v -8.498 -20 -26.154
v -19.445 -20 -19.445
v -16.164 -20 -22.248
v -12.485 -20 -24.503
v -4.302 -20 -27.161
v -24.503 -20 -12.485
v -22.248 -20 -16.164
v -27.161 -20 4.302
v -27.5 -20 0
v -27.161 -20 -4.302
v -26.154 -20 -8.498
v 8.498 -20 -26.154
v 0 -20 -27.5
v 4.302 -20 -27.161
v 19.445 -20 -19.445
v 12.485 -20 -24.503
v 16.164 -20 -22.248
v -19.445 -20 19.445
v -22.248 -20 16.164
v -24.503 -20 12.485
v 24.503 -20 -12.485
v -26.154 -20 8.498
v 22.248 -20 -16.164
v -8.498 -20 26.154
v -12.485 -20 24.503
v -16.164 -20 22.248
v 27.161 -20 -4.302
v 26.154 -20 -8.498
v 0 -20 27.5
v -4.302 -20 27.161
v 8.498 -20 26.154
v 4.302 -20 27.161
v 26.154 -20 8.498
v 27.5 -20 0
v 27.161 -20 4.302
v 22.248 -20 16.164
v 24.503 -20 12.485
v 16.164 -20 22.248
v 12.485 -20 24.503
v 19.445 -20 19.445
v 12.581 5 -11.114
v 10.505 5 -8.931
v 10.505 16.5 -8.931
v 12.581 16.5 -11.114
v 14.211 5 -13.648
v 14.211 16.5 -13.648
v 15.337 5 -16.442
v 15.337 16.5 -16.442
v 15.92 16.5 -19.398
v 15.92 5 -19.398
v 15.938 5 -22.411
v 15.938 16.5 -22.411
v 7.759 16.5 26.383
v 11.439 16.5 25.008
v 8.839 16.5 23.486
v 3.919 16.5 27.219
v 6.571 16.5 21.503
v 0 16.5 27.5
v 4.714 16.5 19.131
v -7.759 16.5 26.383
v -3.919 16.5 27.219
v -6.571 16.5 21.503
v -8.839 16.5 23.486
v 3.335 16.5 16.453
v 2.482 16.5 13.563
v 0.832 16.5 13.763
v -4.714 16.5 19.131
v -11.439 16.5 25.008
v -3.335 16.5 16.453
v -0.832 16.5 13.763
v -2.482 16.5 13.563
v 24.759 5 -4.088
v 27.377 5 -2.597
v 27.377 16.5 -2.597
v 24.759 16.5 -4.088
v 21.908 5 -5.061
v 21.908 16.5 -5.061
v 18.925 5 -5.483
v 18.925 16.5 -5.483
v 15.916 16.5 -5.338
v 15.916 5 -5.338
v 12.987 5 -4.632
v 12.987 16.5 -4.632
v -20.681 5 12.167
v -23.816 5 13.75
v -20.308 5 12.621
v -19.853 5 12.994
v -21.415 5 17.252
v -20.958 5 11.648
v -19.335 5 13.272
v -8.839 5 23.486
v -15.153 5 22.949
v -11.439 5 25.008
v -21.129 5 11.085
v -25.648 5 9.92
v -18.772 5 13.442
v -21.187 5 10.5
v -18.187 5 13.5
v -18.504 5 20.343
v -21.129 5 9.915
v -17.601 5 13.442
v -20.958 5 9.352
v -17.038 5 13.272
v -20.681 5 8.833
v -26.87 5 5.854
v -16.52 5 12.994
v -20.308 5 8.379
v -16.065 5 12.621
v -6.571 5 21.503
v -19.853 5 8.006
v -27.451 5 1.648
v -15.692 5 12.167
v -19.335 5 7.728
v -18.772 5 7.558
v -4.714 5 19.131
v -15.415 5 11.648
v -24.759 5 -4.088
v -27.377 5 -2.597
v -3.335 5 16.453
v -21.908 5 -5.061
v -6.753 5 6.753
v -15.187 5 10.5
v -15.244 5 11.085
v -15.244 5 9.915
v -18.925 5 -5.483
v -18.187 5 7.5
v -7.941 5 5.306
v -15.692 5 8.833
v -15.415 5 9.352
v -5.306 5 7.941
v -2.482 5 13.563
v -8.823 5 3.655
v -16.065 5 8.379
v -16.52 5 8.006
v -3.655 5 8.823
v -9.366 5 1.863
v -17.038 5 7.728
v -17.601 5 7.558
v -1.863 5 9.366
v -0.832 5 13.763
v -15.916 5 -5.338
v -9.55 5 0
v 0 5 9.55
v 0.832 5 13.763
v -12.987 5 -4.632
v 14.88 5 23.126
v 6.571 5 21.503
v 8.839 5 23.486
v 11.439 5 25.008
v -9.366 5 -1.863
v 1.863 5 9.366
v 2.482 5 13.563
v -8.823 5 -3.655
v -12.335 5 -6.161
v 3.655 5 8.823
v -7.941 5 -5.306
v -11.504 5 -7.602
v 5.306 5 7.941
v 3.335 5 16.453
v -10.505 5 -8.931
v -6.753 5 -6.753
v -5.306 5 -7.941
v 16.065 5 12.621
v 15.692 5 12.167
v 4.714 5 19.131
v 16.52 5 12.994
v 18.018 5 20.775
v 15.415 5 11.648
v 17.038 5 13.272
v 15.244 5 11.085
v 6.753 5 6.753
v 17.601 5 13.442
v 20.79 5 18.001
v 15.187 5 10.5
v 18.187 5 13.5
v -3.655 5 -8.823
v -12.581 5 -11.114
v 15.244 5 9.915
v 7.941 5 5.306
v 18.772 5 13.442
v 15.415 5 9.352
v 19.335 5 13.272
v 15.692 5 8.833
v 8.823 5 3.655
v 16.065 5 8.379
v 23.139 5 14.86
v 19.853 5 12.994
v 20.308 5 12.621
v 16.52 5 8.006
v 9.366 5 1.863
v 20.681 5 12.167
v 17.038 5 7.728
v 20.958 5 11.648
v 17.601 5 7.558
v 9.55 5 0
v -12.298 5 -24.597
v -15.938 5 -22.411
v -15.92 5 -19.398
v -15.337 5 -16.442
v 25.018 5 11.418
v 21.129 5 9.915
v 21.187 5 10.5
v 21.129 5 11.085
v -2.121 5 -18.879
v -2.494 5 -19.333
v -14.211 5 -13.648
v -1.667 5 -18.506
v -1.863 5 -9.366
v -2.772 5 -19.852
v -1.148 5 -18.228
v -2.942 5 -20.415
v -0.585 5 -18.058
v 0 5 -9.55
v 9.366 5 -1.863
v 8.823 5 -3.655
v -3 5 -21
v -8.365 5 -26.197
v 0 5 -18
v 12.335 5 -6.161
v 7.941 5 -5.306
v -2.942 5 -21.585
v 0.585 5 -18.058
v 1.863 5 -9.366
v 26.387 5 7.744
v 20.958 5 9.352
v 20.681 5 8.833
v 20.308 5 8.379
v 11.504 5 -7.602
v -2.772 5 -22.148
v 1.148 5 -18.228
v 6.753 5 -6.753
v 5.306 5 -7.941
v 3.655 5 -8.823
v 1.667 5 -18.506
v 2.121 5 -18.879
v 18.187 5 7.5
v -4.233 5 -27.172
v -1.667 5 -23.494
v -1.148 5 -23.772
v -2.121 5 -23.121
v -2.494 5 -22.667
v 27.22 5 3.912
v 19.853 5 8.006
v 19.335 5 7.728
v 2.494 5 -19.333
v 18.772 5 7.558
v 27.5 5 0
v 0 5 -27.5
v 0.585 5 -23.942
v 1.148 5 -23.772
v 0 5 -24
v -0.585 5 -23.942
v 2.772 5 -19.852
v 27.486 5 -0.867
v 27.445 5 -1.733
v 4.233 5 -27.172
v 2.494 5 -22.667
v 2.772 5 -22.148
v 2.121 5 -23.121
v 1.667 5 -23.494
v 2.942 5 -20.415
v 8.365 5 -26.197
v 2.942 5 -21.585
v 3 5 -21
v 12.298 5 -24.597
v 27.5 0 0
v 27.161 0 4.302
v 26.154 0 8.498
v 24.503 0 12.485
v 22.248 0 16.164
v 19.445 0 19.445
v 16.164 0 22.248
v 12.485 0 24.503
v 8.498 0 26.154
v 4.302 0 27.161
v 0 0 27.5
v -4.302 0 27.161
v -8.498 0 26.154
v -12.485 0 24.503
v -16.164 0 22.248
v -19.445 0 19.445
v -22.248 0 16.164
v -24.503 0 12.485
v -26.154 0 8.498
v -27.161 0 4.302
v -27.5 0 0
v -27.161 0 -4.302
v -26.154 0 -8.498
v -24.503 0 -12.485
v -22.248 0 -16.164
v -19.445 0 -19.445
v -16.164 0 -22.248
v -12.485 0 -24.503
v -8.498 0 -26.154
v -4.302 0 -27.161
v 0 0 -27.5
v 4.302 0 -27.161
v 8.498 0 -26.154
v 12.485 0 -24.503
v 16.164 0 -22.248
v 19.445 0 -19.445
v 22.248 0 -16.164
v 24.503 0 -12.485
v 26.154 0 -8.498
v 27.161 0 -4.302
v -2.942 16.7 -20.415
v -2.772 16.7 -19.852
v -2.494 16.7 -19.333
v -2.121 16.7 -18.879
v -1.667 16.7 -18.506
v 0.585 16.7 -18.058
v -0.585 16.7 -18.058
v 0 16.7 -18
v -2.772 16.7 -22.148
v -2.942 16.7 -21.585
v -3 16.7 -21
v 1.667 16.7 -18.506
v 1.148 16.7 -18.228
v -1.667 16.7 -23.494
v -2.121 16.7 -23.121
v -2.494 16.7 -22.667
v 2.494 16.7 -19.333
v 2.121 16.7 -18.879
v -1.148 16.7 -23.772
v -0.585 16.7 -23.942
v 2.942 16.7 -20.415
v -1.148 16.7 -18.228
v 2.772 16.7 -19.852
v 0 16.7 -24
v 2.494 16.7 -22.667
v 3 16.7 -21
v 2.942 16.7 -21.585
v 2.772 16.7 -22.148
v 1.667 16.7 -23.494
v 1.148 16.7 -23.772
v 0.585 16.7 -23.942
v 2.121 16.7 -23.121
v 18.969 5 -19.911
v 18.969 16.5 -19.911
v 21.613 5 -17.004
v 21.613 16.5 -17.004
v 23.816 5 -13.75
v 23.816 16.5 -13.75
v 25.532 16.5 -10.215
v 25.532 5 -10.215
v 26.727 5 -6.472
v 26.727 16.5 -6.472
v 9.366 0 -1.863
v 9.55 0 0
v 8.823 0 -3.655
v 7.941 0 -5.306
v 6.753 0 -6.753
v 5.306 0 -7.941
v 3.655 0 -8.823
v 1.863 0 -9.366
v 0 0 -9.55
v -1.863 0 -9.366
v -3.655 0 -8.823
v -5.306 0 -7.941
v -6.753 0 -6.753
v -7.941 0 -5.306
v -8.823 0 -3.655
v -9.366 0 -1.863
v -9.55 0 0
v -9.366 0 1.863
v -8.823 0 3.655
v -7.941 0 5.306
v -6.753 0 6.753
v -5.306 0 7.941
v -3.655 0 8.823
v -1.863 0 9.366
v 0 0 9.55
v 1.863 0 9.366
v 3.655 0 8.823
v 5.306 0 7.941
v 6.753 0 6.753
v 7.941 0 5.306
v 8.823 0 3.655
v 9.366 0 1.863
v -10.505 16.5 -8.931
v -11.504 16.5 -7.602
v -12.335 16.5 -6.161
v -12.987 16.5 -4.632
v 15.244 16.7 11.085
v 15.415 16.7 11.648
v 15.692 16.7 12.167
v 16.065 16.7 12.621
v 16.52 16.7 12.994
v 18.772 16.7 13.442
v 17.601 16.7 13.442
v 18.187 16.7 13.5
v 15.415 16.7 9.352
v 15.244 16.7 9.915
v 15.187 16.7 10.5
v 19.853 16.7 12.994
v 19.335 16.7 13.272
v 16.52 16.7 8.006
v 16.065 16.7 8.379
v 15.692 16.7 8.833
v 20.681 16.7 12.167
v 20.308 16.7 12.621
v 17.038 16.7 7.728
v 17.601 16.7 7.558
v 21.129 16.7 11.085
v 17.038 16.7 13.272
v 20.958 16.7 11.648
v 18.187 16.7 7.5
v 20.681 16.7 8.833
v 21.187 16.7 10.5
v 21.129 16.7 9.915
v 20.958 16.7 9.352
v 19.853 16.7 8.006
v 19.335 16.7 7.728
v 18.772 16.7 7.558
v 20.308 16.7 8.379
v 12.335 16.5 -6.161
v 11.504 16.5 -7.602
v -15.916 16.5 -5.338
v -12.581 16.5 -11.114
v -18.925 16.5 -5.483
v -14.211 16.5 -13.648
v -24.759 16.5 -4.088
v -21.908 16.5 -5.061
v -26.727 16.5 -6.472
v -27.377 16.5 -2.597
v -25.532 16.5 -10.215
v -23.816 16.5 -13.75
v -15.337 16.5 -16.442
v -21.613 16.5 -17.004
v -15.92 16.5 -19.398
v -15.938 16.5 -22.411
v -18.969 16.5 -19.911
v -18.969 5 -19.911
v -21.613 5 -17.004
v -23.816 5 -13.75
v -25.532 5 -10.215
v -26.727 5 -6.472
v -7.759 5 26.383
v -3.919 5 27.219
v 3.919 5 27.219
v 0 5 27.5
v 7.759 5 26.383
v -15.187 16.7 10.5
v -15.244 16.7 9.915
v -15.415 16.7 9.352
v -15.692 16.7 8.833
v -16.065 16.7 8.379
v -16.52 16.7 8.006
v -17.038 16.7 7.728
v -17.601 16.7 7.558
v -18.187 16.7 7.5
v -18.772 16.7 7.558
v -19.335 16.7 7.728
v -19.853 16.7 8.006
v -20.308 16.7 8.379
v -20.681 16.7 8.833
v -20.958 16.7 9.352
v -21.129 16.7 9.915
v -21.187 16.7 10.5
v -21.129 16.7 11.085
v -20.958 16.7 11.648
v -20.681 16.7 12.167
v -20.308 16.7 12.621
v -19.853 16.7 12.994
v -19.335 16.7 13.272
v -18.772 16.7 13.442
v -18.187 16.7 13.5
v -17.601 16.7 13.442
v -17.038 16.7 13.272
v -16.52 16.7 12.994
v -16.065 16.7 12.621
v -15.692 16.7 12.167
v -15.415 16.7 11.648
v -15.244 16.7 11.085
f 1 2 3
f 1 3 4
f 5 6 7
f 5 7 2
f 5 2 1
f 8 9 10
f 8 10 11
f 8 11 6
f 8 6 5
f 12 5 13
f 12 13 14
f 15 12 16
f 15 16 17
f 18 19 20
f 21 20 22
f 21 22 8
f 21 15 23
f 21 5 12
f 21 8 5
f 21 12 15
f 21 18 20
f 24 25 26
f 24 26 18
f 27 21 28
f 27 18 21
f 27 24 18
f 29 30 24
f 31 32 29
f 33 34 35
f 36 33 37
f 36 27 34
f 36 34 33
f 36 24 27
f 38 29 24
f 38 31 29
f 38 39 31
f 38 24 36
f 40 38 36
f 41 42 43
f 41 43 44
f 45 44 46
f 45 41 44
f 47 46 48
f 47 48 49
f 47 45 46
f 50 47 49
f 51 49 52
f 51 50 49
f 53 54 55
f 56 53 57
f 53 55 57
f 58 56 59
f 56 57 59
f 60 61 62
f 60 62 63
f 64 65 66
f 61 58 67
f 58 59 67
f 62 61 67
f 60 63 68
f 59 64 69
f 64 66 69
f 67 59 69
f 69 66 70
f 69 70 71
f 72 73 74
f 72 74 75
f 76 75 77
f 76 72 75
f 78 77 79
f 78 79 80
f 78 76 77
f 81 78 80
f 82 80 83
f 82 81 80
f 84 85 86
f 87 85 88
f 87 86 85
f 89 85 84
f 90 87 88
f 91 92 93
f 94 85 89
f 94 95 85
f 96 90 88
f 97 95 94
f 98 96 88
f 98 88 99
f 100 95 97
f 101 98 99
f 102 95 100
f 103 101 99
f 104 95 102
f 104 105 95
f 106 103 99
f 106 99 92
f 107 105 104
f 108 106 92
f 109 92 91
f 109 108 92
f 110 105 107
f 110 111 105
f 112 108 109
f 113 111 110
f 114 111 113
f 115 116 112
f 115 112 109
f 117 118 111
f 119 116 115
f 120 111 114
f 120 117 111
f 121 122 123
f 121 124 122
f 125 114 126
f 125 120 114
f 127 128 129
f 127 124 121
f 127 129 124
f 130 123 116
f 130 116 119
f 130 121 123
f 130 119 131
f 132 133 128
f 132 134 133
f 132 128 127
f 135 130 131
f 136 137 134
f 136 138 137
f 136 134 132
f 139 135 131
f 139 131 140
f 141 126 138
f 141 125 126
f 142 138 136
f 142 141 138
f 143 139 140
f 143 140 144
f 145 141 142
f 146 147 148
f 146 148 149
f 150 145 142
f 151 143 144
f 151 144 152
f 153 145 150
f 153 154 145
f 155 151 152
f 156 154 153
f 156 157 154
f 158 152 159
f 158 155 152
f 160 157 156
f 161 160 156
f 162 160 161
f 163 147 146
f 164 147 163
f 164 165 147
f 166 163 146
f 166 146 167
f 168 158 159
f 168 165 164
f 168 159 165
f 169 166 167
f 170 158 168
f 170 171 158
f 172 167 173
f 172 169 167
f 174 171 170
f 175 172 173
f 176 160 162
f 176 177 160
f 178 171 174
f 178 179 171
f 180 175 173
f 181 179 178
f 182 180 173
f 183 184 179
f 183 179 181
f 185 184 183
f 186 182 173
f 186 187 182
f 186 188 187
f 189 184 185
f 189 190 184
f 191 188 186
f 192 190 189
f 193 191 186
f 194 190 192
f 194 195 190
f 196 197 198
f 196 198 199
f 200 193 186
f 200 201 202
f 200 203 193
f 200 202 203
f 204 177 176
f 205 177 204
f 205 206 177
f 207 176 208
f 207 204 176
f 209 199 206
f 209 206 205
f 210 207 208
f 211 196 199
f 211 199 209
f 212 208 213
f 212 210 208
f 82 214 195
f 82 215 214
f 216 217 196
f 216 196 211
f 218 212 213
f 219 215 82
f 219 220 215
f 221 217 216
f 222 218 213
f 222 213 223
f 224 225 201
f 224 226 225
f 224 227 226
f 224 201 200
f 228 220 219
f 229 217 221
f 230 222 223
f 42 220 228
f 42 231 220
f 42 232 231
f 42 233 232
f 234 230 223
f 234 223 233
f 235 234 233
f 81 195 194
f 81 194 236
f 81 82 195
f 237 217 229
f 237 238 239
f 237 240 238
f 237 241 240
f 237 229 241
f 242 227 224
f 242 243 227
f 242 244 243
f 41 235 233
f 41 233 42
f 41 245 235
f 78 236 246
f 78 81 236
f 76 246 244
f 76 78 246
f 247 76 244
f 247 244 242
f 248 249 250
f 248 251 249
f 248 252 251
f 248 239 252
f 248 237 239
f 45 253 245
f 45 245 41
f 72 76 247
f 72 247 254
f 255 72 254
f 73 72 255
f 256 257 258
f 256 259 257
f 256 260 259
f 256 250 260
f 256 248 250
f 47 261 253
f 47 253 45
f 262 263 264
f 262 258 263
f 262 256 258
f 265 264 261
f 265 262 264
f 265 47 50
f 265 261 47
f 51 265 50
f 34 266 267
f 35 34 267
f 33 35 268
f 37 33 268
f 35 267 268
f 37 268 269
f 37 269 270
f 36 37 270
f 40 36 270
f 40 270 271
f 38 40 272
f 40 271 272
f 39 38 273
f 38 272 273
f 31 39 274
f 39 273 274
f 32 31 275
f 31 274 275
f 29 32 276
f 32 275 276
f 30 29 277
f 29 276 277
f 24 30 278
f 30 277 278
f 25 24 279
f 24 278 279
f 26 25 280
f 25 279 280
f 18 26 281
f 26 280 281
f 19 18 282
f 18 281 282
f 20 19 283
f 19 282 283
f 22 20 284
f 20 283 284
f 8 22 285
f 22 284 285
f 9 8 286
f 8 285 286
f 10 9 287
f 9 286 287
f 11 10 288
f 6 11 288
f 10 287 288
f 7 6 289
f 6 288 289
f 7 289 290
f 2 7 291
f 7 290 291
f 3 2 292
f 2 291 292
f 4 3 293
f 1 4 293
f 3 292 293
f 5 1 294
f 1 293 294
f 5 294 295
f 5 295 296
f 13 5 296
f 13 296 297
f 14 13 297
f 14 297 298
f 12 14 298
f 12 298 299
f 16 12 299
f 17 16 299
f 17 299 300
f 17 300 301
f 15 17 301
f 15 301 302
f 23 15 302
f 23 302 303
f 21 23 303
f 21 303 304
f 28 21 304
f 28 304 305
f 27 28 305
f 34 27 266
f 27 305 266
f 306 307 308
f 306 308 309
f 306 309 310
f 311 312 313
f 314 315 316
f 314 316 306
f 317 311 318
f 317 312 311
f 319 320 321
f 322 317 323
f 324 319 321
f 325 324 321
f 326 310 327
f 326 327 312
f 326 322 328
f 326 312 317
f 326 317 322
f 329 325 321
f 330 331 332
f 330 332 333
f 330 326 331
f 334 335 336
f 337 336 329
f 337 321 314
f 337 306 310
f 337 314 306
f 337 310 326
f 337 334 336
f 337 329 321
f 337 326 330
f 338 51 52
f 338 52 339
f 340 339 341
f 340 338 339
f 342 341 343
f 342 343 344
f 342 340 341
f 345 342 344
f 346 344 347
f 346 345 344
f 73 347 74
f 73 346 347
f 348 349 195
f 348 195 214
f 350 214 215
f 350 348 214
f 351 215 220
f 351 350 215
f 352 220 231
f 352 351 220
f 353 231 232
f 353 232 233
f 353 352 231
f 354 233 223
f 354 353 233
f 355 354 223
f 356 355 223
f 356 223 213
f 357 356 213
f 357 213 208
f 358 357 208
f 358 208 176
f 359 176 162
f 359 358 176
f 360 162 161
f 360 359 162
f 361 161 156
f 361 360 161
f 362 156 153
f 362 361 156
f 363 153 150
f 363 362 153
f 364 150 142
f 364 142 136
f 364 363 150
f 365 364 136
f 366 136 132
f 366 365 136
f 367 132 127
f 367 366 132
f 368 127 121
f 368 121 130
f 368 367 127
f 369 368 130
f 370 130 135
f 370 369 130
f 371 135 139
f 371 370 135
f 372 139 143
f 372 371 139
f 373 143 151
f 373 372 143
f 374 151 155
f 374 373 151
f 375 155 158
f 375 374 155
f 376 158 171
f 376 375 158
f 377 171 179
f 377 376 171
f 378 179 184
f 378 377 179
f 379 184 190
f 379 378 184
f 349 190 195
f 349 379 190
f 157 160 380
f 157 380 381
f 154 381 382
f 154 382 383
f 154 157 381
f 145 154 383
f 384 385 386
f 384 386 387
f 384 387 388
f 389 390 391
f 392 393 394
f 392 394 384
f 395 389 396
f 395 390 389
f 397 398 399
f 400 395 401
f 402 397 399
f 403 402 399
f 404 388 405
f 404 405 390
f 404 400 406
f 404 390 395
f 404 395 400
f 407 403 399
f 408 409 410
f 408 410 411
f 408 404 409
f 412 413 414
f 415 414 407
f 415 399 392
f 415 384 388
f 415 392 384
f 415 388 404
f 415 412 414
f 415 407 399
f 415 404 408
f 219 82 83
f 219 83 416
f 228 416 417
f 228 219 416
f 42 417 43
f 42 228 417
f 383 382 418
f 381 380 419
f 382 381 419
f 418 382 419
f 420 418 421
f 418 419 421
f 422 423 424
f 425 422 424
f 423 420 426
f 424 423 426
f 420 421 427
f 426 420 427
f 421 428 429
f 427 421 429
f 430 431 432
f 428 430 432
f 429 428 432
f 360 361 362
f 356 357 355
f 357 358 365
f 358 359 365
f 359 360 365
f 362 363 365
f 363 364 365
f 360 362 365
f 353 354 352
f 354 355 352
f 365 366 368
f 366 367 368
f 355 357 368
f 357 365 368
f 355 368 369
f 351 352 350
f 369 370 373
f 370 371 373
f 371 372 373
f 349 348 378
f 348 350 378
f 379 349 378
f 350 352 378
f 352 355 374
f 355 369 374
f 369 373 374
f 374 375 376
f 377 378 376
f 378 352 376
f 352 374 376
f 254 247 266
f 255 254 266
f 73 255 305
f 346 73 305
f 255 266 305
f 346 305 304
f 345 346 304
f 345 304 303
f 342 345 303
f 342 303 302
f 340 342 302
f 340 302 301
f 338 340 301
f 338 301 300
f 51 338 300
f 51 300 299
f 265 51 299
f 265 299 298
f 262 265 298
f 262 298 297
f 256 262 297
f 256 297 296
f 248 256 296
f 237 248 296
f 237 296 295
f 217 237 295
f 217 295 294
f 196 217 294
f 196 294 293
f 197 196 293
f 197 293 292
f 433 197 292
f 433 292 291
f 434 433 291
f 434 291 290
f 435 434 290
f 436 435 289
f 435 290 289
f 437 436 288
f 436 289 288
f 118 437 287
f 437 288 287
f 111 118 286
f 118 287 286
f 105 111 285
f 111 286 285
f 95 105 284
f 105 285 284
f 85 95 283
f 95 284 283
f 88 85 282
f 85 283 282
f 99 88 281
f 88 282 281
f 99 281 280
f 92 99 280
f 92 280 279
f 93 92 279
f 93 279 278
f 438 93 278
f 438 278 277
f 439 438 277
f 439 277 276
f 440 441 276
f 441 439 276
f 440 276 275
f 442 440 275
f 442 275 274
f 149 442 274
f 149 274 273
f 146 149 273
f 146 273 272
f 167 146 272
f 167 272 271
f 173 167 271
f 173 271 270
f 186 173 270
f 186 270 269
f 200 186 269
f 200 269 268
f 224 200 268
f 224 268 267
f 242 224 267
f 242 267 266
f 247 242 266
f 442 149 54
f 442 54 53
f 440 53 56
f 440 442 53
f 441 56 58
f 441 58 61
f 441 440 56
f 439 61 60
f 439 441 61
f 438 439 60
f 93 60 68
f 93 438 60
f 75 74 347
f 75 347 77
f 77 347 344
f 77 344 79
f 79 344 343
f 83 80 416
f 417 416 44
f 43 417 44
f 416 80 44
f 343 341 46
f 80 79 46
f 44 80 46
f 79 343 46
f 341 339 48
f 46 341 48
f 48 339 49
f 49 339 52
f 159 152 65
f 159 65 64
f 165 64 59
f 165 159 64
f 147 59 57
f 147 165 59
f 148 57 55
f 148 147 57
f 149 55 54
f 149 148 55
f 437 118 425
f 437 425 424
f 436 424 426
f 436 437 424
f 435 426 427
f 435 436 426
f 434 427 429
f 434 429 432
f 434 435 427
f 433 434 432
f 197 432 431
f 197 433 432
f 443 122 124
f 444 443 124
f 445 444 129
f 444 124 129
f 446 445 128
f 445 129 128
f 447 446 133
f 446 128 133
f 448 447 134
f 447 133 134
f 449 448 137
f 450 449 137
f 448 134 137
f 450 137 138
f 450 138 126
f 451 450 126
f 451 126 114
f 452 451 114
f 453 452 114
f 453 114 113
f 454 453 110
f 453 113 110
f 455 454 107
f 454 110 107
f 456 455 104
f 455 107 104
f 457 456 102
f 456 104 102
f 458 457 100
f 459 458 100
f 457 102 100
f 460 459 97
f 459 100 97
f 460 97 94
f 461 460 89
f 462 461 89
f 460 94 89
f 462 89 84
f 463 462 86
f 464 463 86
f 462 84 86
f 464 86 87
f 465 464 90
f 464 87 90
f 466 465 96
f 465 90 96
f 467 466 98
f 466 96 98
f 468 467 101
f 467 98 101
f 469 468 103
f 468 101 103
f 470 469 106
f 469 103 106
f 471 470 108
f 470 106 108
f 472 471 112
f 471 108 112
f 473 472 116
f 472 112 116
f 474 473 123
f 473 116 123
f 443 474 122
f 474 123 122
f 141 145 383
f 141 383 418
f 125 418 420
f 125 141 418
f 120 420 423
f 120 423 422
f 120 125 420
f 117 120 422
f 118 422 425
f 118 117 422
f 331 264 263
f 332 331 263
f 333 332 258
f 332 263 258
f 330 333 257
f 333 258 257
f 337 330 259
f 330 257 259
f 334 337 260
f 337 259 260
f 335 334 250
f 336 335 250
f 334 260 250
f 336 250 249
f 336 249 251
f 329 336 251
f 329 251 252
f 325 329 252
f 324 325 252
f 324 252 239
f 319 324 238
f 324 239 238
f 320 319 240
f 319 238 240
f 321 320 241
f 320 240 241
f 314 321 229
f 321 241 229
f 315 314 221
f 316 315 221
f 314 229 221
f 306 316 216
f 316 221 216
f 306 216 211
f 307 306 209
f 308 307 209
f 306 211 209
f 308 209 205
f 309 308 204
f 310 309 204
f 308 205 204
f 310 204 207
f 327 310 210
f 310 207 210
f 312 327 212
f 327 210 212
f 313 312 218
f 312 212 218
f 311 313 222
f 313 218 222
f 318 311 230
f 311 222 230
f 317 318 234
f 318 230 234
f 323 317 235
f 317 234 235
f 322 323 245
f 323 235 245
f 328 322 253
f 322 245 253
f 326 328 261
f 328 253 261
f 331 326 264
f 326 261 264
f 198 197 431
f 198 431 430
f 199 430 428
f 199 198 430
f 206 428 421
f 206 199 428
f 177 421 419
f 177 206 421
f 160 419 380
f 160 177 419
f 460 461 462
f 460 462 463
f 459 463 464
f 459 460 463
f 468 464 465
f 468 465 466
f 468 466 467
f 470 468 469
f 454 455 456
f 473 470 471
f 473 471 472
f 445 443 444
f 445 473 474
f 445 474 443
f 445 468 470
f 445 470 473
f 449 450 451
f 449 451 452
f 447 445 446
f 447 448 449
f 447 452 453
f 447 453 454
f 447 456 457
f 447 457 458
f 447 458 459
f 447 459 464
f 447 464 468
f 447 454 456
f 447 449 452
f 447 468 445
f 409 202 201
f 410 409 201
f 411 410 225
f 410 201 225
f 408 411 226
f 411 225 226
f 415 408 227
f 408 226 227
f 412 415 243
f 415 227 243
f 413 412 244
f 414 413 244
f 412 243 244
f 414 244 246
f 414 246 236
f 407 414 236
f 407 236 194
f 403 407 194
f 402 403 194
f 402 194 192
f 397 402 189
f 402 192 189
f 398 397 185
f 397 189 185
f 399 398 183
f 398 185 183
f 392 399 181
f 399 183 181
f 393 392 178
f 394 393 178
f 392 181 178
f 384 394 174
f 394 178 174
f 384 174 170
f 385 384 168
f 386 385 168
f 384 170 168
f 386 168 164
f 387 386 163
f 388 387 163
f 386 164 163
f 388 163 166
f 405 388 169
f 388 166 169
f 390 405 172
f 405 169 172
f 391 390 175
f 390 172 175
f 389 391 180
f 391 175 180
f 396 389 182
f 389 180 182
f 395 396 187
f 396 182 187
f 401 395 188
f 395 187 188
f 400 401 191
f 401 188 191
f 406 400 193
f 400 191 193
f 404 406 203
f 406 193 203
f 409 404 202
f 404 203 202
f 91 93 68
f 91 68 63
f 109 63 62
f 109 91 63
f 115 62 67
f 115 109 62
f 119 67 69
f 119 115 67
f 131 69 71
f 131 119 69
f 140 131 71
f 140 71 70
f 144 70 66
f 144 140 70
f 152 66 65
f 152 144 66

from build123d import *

# Parameters (mm, degrees)
SKETCH1_R           = 27.5
SKETCH1_R_2         = 9.55
BOSS_EXTRUDE1_DEPTH = 5
SKETCH2_R           = 3
BOSS_EXTRUDE2_DEPTH = 11.7
BOSS_EXTRUDE3_DEPTH = 11.5
SKETCH6_R           = 27.5
BOSS_EXTRUDE4_DEPTH = 20


with BuildPart() as part:
    # Sketch1 → Boss-Extrude1 (new body)
    with BuildSketch(Plane(origin=(0, 0, 0), x_dir=(1, 0, 0), z_dir=(0, 1, 0))):
        Circle(SKETCH1_R)
        Circle(SKETCH1_R_2, mode=Mode.SUBTRACT)
    extrude(amount=BOSS_EXTRUDE1_DEPTH)

    # Sketch2 → Boss-Extrude2 (add)
    with BuildSketch(Plane(origin=(0, 5, 0), x_dir=(1, 0, 0), z_dir=(0, 1, 0))):
        with Locations((0, 21)):
            Circle(SKETCH2_R)
        with Locations((18.186533479, -10.5)):
            Circle(SKETCH2_R)
        with Locations((-18.186533479, -10.5)):
            Circle(SKETCH2_R)
    extrude(amount=BOSS_EXTRUDE2_DEPTH)

    # Sketch3 → Boss-Extrude3 (add)
    with BuildSketch(Plane(origin=(0, 5, 0), x_dir=(1, 0, 0), z_dir=(0, 1, 0))):
        with BuildLine():
            ThreePointArc((-15.937687574, 22.410714286), (-14.839908311, 15.01860206), (-10.504684652, 8.931379517))
            ThreePointArc((-10.504684652, 8.931379517), (-11.941040775, 6.894163106), (-12.987143879, 4.631634009))
            ThreePointArc((-12.987143879, 4.631634009), (-20.426445069, 5.342436557), (-27.377091675, 2.597085174))
            ThreePointArc((-27.377091675, 2.597085174), (-23.815698604, 13.75), (-15.937687574, 22.410714286))
        make_face()
        with BuildLine():
            ThreePointArc((2.482459227, -13.563013526), (5.586536758, -20.361038617), (11.439404101, -25.007799459))
            ThreePointArc((11.439404101, -25.007799459), (0, -27.5), (-11.439404101, -25.007799459))
            ThreePointArc((-11.439404101, -25.007799459), (-5.586536758, -20.361038617), (-2.482459227, -13.563013526))
            ThreePointArc((-2.482459227, -13.563013526), (0, -13.788326212), (2.482459227, -13.563013526))
        make_face()
        with BuildLine():
            ThreePointArc((10.504684652, 8.931379517), (14.839908311, 15.01860206), (15.937687574, 22.410714286))
            ThreePointArc((15.937687574, 22.410714286), (23.815698604, 13.75), (27.377091675, 2.597085174))
            ThreePointArc((27.377091675, 2.597085174), (20.426445069, 5.342436557), (12.987143879, 4.631634009))
            ThreePointArc((12.987143879, 4.631634009), (11.941040775, 6.894163106), (10.504684652, 8.931379517))
        make_face()
    extrude(amount=BOSS_EXTRUDE3_DEPTH)

    # Sketch6 → Boss-Extrude4 (add)
    with BuildSketch(Plane.XZ):
        Circle(SKETCH6_R)
    extrude(amount=BOSS_EXTRUDE4_DEPTH)


solid = part.part
